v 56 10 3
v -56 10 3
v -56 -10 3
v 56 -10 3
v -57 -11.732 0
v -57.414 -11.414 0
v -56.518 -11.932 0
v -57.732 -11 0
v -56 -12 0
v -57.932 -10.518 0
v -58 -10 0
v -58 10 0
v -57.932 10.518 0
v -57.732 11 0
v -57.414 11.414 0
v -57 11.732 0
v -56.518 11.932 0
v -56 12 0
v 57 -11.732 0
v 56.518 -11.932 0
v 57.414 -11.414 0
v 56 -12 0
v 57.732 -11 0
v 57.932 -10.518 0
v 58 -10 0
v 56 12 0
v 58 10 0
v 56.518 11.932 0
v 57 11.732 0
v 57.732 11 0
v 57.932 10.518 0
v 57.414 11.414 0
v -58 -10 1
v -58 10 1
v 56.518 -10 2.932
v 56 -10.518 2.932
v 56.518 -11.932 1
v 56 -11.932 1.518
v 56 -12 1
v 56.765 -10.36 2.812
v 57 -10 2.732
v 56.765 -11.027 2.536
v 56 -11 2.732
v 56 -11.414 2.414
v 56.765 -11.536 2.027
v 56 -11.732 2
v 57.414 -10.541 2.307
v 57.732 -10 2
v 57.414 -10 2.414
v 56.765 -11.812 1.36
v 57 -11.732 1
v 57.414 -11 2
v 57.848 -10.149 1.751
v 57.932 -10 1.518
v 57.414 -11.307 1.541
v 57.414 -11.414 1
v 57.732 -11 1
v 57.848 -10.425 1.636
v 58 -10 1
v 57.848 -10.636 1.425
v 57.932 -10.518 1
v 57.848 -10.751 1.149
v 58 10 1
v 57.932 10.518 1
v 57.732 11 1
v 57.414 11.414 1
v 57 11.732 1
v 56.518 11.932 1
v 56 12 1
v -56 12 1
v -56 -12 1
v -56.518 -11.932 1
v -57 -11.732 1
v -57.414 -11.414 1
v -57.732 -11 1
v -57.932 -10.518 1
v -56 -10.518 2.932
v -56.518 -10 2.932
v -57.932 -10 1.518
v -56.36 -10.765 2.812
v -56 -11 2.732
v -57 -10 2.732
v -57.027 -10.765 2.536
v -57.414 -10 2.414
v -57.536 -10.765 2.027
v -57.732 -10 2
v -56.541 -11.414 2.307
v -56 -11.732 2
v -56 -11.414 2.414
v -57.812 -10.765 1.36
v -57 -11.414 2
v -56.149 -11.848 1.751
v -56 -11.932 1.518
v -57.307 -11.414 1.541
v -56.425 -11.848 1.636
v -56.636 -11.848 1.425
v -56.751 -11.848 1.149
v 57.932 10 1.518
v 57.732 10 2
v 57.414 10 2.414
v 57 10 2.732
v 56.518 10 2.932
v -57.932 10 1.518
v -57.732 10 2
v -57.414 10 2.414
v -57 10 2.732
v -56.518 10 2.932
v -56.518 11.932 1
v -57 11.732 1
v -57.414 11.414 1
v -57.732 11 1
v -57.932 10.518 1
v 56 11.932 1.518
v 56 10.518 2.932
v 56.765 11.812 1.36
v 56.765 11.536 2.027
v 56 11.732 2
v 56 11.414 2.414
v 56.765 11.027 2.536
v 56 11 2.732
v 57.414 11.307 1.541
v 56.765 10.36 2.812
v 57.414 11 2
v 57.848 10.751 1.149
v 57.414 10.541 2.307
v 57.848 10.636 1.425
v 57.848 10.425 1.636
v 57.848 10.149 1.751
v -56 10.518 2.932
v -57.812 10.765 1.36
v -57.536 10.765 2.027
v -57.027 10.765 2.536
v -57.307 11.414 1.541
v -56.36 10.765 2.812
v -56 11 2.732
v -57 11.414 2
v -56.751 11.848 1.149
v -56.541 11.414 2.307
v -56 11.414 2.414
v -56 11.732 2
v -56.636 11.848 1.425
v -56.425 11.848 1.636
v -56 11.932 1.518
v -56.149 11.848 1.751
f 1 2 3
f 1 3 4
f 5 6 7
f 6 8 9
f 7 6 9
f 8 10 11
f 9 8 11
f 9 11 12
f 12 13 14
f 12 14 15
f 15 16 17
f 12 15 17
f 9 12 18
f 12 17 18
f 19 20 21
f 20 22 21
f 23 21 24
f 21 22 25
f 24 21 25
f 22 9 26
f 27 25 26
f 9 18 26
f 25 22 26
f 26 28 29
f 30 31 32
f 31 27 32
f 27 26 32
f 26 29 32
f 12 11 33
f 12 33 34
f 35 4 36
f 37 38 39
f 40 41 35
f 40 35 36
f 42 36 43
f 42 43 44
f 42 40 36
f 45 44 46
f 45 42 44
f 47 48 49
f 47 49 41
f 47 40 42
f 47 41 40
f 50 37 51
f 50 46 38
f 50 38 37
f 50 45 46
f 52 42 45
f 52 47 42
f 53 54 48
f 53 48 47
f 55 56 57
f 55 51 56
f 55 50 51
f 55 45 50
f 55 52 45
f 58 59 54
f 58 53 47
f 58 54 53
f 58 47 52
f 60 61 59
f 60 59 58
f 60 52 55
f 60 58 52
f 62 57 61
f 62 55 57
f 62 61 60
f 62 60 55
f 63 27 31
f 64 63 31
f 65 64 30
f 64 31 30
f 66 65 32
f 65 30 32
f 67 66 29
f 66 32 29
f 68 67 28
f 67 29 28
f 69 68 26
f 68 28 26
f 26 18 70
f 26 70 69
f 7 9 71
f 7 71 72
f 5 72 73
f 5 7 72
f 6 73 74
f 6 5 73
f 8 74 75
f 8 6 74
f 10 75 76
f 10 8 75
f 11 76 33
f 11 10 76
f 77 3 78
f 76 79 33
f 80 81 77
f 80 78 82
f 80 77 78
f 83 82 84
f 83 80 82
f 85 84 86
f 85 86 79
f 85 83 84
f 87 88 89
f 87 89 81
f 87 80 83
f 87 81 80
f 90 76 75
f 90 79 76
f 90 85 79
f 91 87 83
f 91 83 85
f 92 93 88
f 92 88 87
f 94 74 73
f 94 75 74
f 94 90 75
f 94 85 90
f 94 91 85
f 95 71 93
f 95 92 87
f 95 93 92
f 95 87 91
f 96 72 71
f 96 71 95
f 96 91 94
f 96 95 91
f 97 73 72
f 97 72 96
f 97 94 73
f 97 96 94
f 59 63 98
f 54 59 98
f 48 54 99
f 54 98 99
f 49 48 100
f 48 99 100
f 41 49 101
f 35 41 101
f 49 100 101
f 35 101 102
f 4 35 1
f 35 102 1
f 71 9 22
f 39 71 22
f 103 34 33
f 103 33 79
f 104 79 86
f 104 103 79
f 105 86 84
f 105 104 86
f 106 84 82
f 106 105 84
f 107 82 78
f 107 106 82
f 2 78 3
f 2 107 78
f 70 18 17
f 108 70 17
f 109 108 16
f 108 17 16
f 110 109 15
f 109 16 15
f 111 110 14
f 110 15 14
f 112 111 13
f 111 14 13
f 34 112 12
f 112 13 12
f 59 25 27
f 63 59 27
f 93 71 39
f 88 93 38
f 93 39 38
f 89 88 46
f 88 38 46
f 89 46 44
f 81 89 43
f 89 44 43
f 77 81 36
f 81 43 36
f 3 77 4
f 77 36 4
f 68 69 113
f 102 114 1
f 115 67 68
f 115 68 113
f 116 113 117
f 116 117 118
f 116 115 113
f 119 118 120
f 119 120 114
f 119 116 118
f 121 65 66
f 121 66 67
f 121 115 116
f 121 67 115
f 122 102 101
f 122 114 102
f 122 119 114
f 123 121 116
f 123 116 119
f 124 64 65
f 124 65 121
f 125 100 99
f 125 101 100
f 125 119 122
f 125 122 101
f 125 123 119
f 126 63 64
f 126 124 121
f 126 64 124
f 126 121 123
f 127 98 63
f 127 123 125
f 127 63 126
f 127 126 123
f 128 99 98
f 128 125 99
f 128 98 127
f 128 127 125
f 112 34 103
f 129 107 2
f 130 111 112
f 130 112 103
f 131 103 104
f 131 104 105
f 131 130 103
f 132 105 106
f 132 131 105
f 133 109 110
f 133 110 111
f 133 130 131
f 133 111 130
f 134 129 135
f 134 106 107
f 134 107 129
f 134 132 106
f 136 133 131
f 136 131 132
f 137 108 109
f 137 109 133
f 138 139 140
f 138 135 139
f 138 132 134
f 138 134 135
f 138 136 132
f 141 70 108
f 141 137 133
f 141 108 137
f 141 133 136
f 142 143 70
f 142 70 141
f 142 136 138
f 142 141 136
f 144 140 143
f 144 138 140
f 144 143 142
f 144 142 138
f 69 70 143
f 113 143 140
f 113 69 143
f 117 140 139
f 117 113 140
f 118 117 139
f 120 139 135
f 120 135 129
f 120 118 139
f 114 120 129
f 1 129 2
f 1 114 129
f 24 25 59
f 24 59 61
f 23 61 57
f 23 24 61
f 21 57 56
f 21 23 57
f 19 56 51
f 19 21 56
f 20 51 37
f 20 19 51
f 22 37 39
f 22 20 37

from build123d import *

# Parameters (mm, degrees)
F0_W         = 116
F0_H         = 24
F1_DEPTH     = 3
F2_R         = 2
F3_T1_DEPTH  = 6
F3_S5_W      = 2
F3_S5_H      = 2
F3_T6_DEPTH  = 2
F3_S11_W     = 2
F3_S11_H     = 2
F3_T12_DEPTH = 2
F3_S17_W     = 2
F3_S17_H     = 2
F3_T18_DEPTH = 2
F3_S23_W     = 2
F3_S23_H     = 2
F3_T24_DEPTH = 2


# Not quite as in the source:
# - a fillet or chamfer that OpenCascade refuses, or shapes differently, is made with other operations: its cross-section is extruded or revolved along the edge and cut away or added


with BuildPart() as f1:
    # F0 (on Top) → F1 (new body)
    with BuildSketch(Plane.XY):
        Rectangle(F0_W, F0_H)
    extrude(amount=F1_DEPTH)

    # F2
    f2_edges = [f1.edges().sort_by_distance(p)[0] for p in [
        (58, 0, 3),
        (0, 12, 3),
        (-58, 0, 3),
        (0, -12, 3),
    ]]
    fillet(f2_edges, radius=F2_R)

    # F3: fillet of radius 2 on 4 edges, made by hand

    # F3_s2 → F3_t1 (cut)
    with BuildSketch(Plane.XY.offset(-5)):
        with BuildLine():
            ThreePointArc((58, -10), (57.4142135624, -11.4142135624), (56, -12))
            Line((56, -12), (58, -12))
            Line((58, -12), (58, -10))
        make_face()
        with BuildLine():
            ThreePointArc((58, 10), (57.4142135624, 11.4142135624), (56, 12))
            Line((56, 12), (58, 12))
            Line((58, 12), (58, 10))
        make_face()
        with BuildLine():
            ThreePointArc((-56, -12), (-57.4142135624, -11.4142135624), (-58, -10))
            Line((-58, -10), (-58, -12))
            Line((-58, -12), (-56, -12))
        make_face()
        with BuildLine():
            ThreePointArc((-56, 12), (-57.4142135624, 11.4142135624), (-58, 10))
            Line((-58, 10), (-58, 12))
            Line((-58, 12), (-56, 12))
        make_face()
    extrude(amount=F3_T1_DEPTH, mode=Mode.SUBTRACT)


with BuildPart() as f3_tool4:
    # F3_s5 → F3_t6 (new body)
    with BuildSketch(Plane.XZ.offset(-10)):
        with Locations((-57, 2)):
            Rectangle(F3_S5_W, F3_S5_H)
    extrude(amount=-F3_T6_DEPTH)

    # F3_s7 → F3_t8 (revolve, cut)
    with BuildSketch(Plane(origin=(-56, 10, 1), x_dir=(0.7071067812, 0, -0.7071067812), z_dir=(0.7071067812, 0, 0.7071067812))):
        with BuildLine():
            ThreePointArc((0, -2), (2, 0), (0, 2))
            Line((0, 2), (0, -2))
        make_face()
    revolve(axis=Axis((-56, 10, 1), (0, 1, 0)), mode=Mode.SUBTRACT)


with BuildPart() as f1_1:
    add(f1.part)

    # F3_t3: cut F3_tool4
    add(f3_tool4.part, mode=Mode.SUBTRACT)


with BuildPart() as f3_tool10:
    # F3_s11 → F3_t12 (new body)
    with BuildSketch(Plane.XZ.offset(10)):
        with Locations((-57, 2)):
            Rectangle(F3_S11_W, F3_S11_H)
    extrude(amount=F3_T12_DEPTH)

    # F3_s13 → F3_t14 (revolve, cut)
    with BuildSketch(Plane(origin=(-56, -10, 1), x_dir=(0.7071067812, 0, -0.7071067812), z_dir=(-0.7071067812, 0, -0.7071067812))):
        with BuildLine():
            ThreePointArc((0, -2), (2, 0), (0, 2))
            Line((0, 2), (0, -2))
        make_face()
    revolve(axis=Axis((-56, -10, 1), (0, -1, 0)), mode=Mode.SUBTRACT)


with BuildPart() as f1_2:
    add(f1_1.part)

    # F3_t9: cut F3_tool10
    add(f3_tool10.part, mode=Mode.SUBTRACT)


with BuildPart() as f3_tool16:
    # F3_s17 → F3_t18 (new body)
    with BuildSketch(Plane.YZ.offset(56)):
        with Locations((11, 2)):
            Rectangle(F3_S17_W, F3_S17_H)
    extrude(amount=F3_T18_DEPTH)

    # F3_s19 → F3_t20 (revolve, cut)
    with BuildSketch(Plane(origin=(56, 10, 1), x_dir=(0, -0.7071067812, -0.7071067812), z_dir=(0, -0.7071067812, 0.7071067812))):
        with BuildLine():
            ThreePointArc((0, -2), (2, 0), (0, 2))
            Line((0, 2), (0, -2))
        make_face()
    revolve(axis=Axis((56, 10, 1), (1, 0, 0)), mode=Mode.SUBTRACT)


with BuildPart() as f1_3:
    add(f1_2.part)

    # F3_t15: cut F3_tool16
    add(f3_tool16.part, mode=Mode.SUBTRACT)


with BuildPart() as f3_tool22:
    # F3_s23 → F3_t24 (new body)
    with BuildSketch(Plane.YZ.offset(56)):
        with Locations((-11, 2)):
            Rectangle(F3_S23_W, F3_S23_H)
    extrude(amount=F3_T24_DEPTH)

    # F3_s25 → F3_t26 (revolve, cut)
    with BuildSketch(Plane(origin=(56, -10, 1), x_dir=(0, 0.7071067812, -0.7071067812), z_dir=(0, -0.7071067812, -0.7071067812))):
        with BuildLine():
            ThreePointArc((0, -2), (2, 0), (0, 2))
            Line((0, 2), (0, -2))
        make_face()
    revolve(axis=Axis((56, -10, 1), (1, 0, 0)), mode=Mode.SUBTRACT)


with BuildPart() as f1_4:
    add(f1_3.part)

    # F3_t21: cut F3_tool22
    add(f3_tool22.part, mode=Mode.SUBTRACT)


solid = f1_4.part
